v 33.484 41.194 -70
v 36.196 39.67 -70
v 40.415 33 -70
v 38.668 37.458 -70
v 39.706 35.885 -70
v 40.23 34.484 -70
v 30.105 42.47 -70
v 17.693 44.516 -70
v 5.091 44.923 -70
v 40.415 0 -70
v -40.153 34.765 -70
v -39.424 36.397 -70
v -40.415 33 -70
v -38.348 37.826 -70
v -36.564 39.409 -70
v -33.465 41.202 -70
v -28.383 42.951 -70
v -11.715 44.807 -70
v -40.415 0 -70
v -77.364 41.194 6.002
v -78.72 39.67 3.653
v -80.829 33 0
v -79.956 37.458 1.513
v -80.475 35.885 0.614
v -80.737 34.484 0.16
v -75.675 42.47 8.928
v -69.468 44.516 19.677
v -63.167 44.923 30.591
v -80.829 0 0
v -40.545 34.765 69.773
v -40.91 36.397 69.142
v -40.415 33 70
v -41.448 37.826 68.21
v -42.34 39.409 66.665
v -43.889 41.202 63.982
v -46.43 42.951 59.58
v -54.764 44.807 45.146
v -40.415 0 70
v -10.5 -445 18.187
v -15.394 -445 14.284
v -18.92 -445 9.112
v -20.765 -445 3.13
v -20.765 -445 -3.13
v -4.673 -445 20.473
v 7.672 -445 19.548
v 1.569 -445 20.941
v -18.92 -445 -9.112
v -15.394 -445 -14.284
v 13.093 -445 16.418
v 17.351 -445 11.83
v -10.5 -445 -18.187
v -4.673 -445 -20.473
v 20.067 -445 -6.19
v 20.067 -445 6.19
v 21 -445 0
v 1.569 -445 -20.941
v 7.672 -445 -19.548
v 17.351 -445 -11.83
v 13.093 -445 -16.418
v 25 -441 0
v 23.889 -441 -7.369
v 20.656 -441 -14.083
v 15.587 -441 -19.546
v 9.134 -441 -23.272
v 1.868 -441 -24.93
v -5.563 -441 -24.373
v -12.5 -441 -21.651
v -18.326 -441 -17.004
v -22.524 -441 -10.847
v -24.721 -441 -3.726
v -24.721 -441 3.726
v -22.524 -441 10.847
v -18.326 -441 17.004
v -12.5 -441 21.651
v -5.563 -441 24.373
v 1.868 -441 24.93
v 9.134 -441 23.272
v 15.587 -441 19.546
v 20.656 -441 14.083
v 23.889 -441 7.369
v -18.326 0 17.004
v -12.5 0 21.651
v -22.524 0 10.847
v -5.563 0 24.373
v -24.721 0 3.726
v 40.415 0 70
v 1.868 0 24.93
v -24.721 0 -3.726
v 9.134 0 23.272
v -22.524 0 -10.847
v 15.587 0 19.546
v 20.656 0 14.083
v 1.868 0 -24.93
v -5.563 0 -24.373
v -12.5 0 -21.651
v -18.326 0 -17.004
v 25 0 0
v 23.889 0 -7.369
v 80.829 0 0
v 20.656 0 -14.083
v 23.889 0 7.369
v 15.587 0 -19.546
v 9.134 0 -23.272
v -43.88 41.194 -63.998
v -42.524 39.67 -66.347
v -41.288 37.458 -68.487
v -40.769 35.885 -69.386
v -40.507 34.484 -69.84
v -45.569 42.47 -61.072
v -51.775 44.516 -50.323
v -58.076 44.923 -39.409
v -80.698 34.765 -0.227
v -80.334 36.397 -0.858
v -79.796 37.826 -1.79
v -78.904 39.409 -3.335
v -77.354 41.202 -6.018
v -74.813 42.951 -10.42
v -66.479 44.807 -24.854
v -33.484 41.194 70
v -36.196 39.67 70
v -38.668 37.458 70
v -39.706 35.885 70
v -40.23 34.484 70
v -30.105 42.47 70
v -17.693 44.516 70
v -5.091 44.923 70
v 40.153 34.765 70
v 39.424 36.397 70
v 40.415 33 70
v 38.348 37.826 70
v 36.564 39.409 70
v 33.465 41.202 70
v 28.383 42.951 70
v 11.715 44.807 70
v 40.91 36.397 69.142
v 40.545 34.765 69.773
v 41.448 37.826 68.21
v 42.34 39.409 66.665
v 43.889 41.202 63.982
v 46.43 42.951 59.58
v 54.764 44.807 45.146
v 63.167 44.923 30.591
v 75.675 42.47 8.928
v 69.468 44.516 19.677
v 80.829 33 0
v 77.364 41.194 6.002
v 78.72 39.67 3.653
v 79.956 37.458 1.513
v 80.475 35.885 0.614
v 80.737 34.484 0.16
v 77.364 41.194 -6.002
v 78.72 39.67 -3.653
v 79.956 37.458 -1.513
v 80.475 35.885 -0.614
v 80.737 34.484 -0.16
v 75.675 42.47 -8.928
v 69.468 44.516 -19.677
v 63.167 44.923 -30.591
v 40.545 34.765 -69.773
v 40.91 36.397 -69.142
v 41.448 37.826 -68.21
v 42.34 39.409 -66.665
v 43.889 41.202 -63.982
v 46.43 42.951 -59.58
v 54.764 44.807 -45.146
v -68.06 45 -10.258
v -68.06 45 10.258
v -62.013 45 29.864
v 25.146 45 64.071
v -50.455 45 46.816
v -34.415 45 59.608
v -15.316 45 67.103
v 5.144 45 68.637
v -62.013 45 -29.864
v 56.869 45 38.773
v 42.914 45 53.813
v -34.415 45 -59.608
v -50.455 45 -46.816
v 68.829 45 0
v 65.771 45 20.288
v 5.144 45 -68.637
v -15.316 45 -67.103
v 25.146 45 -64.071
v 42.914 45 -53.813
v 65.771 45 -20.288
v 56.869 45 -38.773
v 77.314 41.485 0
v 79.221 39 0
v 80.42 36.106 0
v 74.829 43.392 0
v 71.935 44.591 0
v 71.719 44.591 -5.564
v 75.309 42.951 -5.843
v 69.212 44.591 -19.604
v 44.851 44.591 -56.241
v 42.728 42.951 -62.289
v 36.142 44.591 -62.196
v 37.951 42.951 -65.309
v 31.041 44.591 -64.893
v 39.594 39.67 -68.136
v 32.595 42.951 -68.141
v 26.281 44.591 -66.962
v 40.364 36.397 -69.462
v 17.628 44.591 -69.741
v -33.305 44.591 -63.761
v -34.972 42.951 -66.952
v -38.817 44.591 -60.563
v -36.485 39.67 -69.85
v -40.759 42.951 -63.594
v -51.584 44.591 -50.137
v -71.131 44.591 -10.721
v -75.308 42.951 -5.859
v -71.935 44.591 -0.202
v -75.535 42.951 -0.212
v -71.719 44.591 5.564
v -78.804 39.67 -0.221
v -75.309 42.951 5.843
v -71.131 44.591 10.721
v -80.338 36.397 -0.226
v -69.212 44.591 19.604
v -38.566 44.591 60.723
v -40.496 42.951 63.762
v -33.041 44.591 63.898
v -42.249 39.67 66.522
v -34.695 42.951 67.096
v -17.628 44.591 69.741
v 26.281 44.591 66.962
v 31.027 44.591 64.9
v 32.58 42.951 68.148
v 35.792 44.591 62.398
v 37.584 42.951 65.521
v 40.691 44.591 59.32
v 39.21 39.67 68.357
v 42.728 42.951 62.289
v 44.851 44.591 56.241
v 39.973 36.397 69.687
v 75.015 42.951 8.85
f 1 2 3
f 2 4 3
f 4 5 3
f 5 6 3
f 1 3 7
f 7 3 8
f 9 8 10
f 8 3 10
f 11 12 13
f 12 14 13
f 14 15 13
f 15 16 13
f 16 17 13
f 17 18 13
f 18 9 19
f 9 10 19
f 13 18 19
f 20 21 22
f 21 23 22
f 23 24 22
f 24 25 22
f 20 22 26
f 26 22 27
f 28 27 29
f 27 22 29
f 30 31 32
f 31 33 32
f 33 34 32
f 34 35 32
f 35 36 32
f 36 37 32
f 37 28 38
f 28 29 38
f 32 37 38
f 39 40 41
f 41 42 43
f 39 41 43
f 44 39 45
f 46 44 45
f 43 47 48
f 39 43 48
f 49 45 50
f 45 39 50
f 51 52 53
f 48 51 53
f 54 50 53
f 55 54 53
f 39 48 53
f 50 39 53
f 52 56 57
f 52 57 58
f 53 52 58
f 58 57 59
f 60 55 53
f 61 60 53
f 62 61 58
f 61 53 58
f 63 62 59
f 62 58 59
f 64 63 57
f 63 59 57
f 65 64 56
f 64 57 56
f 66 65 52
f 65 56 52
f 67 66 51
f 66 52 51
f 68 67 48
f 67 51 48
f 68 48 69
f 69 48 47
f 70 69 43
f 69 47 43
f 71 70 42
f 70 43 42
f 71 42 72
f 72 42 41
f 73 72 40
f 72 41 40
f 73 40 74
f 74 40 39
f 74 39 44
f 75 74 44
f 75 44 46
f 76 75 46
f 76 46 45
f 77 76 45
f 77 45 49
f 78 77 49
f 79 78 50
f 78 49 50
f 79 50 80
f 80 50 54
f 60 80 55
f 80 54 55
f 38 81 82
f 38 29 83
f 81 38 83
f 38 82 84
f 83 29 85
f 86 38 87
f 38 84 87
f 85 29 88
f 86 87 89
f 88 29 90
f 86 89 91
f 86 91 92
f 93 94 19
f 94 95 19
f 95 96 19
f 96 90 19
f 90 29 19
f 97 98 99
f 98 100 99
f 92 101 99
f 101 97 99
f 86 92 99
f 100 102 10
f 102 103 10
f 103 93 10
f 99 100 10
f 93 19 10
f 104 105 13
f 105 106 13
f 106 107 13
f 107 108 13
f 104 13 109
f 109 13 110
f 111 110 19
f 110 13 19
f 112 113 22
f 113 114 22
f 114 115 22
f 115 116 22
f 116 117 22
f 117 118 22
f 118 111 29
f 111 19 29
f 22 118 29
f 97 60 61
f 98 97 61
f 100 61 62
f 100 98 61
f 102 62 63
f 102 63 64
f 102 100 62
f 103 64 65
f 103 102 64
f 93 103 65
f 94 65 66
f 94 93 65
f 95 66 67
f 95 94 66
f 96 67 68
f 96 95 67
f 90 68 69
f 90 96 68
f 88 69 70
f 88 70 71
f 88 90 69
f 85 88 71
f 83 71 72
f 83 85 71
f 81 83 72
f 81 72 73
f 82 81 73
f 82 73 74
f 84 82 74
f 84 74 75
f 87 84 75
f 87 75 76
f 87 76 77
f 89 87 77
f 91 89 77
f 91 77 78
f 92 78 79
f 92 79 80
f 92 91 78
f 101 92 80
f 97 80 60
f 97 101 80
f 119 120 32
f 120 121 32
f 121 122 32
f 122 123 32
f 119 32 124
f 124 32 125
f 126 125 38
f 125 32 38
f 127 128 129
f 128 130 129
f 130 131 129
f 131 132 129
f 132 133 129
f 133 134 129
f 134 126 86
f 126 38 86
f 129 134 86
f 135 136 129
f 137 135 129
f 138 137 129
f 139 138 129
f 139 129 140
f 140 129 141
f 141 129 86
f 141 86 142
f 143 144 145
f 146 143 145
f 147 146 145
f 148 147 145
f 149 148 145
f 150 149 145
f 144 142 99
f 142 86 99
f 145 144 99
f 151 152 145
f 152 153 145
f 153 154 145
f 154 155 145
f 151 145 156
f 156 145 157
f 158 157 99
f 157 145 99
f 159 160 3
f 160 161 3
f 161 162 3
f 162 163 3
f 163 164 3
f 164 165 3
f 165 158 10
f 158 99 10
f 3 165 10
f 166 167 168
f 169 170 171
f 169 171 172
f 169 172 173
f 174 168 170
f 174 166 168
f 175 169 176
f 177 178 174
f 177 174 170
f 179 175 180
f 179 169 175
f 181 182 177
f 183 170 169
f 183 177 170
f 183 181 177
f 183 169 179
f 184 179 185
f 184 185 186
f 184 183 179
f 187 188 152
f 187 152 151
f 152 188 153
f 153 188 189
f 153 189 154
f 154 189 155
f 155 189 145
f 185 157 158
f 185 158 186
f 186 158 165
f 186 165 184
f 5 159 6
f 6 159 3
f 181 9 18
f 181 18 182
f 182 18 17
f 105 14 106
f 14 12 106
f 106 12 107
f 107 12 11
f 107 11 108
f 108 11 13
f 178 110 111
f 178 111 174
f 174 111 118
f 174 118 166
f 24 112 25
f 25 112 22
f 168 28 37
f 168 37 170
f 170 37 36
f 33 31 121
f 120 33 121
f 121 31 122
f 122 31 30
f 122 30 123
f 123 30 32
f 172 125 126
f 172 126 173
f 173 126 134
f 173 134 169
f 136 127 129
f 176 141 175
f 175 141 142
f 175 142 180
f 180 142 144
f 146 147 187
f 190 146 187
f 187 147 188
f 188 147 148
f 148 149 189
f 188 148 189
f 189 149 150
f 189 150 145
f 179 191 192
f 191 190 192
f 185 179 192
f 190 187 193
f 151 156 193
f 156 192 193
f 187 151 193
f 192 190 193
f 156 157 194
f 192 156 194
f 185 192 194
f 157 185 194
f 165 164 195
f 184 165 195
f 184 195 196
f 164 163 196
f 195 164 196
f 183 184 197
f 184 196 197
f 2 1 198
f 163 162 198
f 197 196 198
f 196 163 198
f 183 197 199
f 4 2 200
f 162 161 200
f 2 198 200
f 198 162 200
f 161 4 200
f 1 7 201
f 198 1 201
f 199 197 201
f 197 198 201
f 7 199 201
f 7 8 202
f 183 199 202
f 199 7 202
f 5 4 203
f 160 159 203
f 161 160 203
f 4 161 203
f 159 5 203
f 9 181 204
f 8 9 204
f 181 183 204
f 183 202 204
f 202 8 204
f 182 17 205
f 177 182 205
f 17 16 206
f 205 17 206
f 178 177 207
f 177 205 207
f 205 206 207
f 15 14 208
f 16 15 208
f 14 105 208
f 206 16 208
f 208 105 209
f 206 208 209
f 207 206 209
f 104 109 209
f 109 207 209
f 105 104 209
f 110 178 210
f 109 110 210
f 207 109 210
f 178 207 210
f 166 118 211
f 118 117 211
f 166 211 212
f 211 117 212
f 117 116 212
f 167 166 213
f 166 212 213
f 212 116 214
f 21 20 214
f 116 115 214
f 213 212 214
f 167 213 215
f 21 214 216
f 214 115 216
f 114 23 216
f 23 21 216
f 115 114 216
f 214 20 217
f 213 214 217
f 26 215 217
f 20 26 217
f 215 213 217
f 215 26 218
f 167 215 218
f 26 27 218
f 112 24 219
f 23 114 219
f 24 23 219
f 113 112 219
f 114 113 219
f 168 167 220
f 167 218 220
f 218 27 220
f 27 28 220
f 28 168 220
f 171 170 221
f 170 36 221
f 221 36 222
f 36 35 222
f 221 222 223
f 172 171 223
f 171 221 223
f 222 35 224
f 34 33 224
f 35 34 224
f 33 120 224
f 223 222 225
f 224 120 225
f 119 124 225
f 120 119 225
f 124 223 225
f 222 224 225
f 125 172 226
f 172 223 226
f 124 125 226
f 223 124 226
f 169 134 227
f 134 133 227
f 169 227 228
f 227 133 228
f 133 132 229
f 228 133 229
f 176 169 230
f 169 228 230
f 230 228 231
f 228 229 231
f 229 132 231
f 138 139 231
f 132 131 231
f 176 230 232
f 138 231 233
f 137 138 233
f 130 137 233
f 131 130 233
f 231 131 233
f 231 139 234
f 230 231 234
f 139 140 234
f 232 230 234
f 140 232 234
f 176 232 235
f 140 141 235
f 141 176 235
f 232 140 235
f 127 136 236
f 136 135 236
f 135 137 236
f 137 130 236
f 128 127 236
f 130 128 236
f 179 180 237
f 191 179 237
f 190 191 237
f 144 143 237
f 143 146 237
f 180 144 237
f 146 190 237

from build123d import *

# Parameters (mm, degrees)
BOSS_EXTRUDE1_DEPTH = 45
SKETCH3_R           = 25
BOSS_EXTRUDE2_DEPTH = 445
CHAMFER1_SIZE       = 4


with BuildPart() as part:
    # Sketch2 → Boss-Extrude1 (new body)
    with BuildSketch(Plane(origin=(0, 0, 0), x_dir=(1, 0, 0), z_dir=(0, 1, 0))):
        Polygon((80.829037687, 0), (40.414518843, 70), (-40.414518843, 70), (-80.829037687, 0), (-40.414518843, -70), (40.414518843, -70), align=None)
    extrude(amount=BOSS_EXTRUDE1_DEPTH)

    # Sketch3 → Boss-Extrude2 (add)
    with BuildSketch(Plane(origin=(0, 0, 0), x_dir=(1, 0, 0), z_dir=(0, 1, 0))):
        Circle(SKETCH3_R)
    extrude(amount=-BOSS_EXTRUDE2_DEPTH)

    # Sketch4 → Cut-Revolve1 (revolve, cut)
    with BuildSketch(Plane.XY):
        with BuildLine():
            Line((80.829037687, 33), (80.829037687, 45))
            Line((80.829037687, 45), (68.829037687, 45))
            ThreePointArc((68.829037687, 45), (77.314319061, 41.485281374), (80.829037687, 33))
        make_face()
    revolve(axis=Axis((0, 0, 0), (0, 1, 0)), mode=Mode.SUBTRACT)

    # Chamfer1
    chamfer1_edges = [part.edges().sort_by_distance(p)[0] for p in [
        (-25, -445, 0),
    ]]
    chamfer(chamfer1_edges, length=CHAMFER1_SIZE)


solid = part.part
